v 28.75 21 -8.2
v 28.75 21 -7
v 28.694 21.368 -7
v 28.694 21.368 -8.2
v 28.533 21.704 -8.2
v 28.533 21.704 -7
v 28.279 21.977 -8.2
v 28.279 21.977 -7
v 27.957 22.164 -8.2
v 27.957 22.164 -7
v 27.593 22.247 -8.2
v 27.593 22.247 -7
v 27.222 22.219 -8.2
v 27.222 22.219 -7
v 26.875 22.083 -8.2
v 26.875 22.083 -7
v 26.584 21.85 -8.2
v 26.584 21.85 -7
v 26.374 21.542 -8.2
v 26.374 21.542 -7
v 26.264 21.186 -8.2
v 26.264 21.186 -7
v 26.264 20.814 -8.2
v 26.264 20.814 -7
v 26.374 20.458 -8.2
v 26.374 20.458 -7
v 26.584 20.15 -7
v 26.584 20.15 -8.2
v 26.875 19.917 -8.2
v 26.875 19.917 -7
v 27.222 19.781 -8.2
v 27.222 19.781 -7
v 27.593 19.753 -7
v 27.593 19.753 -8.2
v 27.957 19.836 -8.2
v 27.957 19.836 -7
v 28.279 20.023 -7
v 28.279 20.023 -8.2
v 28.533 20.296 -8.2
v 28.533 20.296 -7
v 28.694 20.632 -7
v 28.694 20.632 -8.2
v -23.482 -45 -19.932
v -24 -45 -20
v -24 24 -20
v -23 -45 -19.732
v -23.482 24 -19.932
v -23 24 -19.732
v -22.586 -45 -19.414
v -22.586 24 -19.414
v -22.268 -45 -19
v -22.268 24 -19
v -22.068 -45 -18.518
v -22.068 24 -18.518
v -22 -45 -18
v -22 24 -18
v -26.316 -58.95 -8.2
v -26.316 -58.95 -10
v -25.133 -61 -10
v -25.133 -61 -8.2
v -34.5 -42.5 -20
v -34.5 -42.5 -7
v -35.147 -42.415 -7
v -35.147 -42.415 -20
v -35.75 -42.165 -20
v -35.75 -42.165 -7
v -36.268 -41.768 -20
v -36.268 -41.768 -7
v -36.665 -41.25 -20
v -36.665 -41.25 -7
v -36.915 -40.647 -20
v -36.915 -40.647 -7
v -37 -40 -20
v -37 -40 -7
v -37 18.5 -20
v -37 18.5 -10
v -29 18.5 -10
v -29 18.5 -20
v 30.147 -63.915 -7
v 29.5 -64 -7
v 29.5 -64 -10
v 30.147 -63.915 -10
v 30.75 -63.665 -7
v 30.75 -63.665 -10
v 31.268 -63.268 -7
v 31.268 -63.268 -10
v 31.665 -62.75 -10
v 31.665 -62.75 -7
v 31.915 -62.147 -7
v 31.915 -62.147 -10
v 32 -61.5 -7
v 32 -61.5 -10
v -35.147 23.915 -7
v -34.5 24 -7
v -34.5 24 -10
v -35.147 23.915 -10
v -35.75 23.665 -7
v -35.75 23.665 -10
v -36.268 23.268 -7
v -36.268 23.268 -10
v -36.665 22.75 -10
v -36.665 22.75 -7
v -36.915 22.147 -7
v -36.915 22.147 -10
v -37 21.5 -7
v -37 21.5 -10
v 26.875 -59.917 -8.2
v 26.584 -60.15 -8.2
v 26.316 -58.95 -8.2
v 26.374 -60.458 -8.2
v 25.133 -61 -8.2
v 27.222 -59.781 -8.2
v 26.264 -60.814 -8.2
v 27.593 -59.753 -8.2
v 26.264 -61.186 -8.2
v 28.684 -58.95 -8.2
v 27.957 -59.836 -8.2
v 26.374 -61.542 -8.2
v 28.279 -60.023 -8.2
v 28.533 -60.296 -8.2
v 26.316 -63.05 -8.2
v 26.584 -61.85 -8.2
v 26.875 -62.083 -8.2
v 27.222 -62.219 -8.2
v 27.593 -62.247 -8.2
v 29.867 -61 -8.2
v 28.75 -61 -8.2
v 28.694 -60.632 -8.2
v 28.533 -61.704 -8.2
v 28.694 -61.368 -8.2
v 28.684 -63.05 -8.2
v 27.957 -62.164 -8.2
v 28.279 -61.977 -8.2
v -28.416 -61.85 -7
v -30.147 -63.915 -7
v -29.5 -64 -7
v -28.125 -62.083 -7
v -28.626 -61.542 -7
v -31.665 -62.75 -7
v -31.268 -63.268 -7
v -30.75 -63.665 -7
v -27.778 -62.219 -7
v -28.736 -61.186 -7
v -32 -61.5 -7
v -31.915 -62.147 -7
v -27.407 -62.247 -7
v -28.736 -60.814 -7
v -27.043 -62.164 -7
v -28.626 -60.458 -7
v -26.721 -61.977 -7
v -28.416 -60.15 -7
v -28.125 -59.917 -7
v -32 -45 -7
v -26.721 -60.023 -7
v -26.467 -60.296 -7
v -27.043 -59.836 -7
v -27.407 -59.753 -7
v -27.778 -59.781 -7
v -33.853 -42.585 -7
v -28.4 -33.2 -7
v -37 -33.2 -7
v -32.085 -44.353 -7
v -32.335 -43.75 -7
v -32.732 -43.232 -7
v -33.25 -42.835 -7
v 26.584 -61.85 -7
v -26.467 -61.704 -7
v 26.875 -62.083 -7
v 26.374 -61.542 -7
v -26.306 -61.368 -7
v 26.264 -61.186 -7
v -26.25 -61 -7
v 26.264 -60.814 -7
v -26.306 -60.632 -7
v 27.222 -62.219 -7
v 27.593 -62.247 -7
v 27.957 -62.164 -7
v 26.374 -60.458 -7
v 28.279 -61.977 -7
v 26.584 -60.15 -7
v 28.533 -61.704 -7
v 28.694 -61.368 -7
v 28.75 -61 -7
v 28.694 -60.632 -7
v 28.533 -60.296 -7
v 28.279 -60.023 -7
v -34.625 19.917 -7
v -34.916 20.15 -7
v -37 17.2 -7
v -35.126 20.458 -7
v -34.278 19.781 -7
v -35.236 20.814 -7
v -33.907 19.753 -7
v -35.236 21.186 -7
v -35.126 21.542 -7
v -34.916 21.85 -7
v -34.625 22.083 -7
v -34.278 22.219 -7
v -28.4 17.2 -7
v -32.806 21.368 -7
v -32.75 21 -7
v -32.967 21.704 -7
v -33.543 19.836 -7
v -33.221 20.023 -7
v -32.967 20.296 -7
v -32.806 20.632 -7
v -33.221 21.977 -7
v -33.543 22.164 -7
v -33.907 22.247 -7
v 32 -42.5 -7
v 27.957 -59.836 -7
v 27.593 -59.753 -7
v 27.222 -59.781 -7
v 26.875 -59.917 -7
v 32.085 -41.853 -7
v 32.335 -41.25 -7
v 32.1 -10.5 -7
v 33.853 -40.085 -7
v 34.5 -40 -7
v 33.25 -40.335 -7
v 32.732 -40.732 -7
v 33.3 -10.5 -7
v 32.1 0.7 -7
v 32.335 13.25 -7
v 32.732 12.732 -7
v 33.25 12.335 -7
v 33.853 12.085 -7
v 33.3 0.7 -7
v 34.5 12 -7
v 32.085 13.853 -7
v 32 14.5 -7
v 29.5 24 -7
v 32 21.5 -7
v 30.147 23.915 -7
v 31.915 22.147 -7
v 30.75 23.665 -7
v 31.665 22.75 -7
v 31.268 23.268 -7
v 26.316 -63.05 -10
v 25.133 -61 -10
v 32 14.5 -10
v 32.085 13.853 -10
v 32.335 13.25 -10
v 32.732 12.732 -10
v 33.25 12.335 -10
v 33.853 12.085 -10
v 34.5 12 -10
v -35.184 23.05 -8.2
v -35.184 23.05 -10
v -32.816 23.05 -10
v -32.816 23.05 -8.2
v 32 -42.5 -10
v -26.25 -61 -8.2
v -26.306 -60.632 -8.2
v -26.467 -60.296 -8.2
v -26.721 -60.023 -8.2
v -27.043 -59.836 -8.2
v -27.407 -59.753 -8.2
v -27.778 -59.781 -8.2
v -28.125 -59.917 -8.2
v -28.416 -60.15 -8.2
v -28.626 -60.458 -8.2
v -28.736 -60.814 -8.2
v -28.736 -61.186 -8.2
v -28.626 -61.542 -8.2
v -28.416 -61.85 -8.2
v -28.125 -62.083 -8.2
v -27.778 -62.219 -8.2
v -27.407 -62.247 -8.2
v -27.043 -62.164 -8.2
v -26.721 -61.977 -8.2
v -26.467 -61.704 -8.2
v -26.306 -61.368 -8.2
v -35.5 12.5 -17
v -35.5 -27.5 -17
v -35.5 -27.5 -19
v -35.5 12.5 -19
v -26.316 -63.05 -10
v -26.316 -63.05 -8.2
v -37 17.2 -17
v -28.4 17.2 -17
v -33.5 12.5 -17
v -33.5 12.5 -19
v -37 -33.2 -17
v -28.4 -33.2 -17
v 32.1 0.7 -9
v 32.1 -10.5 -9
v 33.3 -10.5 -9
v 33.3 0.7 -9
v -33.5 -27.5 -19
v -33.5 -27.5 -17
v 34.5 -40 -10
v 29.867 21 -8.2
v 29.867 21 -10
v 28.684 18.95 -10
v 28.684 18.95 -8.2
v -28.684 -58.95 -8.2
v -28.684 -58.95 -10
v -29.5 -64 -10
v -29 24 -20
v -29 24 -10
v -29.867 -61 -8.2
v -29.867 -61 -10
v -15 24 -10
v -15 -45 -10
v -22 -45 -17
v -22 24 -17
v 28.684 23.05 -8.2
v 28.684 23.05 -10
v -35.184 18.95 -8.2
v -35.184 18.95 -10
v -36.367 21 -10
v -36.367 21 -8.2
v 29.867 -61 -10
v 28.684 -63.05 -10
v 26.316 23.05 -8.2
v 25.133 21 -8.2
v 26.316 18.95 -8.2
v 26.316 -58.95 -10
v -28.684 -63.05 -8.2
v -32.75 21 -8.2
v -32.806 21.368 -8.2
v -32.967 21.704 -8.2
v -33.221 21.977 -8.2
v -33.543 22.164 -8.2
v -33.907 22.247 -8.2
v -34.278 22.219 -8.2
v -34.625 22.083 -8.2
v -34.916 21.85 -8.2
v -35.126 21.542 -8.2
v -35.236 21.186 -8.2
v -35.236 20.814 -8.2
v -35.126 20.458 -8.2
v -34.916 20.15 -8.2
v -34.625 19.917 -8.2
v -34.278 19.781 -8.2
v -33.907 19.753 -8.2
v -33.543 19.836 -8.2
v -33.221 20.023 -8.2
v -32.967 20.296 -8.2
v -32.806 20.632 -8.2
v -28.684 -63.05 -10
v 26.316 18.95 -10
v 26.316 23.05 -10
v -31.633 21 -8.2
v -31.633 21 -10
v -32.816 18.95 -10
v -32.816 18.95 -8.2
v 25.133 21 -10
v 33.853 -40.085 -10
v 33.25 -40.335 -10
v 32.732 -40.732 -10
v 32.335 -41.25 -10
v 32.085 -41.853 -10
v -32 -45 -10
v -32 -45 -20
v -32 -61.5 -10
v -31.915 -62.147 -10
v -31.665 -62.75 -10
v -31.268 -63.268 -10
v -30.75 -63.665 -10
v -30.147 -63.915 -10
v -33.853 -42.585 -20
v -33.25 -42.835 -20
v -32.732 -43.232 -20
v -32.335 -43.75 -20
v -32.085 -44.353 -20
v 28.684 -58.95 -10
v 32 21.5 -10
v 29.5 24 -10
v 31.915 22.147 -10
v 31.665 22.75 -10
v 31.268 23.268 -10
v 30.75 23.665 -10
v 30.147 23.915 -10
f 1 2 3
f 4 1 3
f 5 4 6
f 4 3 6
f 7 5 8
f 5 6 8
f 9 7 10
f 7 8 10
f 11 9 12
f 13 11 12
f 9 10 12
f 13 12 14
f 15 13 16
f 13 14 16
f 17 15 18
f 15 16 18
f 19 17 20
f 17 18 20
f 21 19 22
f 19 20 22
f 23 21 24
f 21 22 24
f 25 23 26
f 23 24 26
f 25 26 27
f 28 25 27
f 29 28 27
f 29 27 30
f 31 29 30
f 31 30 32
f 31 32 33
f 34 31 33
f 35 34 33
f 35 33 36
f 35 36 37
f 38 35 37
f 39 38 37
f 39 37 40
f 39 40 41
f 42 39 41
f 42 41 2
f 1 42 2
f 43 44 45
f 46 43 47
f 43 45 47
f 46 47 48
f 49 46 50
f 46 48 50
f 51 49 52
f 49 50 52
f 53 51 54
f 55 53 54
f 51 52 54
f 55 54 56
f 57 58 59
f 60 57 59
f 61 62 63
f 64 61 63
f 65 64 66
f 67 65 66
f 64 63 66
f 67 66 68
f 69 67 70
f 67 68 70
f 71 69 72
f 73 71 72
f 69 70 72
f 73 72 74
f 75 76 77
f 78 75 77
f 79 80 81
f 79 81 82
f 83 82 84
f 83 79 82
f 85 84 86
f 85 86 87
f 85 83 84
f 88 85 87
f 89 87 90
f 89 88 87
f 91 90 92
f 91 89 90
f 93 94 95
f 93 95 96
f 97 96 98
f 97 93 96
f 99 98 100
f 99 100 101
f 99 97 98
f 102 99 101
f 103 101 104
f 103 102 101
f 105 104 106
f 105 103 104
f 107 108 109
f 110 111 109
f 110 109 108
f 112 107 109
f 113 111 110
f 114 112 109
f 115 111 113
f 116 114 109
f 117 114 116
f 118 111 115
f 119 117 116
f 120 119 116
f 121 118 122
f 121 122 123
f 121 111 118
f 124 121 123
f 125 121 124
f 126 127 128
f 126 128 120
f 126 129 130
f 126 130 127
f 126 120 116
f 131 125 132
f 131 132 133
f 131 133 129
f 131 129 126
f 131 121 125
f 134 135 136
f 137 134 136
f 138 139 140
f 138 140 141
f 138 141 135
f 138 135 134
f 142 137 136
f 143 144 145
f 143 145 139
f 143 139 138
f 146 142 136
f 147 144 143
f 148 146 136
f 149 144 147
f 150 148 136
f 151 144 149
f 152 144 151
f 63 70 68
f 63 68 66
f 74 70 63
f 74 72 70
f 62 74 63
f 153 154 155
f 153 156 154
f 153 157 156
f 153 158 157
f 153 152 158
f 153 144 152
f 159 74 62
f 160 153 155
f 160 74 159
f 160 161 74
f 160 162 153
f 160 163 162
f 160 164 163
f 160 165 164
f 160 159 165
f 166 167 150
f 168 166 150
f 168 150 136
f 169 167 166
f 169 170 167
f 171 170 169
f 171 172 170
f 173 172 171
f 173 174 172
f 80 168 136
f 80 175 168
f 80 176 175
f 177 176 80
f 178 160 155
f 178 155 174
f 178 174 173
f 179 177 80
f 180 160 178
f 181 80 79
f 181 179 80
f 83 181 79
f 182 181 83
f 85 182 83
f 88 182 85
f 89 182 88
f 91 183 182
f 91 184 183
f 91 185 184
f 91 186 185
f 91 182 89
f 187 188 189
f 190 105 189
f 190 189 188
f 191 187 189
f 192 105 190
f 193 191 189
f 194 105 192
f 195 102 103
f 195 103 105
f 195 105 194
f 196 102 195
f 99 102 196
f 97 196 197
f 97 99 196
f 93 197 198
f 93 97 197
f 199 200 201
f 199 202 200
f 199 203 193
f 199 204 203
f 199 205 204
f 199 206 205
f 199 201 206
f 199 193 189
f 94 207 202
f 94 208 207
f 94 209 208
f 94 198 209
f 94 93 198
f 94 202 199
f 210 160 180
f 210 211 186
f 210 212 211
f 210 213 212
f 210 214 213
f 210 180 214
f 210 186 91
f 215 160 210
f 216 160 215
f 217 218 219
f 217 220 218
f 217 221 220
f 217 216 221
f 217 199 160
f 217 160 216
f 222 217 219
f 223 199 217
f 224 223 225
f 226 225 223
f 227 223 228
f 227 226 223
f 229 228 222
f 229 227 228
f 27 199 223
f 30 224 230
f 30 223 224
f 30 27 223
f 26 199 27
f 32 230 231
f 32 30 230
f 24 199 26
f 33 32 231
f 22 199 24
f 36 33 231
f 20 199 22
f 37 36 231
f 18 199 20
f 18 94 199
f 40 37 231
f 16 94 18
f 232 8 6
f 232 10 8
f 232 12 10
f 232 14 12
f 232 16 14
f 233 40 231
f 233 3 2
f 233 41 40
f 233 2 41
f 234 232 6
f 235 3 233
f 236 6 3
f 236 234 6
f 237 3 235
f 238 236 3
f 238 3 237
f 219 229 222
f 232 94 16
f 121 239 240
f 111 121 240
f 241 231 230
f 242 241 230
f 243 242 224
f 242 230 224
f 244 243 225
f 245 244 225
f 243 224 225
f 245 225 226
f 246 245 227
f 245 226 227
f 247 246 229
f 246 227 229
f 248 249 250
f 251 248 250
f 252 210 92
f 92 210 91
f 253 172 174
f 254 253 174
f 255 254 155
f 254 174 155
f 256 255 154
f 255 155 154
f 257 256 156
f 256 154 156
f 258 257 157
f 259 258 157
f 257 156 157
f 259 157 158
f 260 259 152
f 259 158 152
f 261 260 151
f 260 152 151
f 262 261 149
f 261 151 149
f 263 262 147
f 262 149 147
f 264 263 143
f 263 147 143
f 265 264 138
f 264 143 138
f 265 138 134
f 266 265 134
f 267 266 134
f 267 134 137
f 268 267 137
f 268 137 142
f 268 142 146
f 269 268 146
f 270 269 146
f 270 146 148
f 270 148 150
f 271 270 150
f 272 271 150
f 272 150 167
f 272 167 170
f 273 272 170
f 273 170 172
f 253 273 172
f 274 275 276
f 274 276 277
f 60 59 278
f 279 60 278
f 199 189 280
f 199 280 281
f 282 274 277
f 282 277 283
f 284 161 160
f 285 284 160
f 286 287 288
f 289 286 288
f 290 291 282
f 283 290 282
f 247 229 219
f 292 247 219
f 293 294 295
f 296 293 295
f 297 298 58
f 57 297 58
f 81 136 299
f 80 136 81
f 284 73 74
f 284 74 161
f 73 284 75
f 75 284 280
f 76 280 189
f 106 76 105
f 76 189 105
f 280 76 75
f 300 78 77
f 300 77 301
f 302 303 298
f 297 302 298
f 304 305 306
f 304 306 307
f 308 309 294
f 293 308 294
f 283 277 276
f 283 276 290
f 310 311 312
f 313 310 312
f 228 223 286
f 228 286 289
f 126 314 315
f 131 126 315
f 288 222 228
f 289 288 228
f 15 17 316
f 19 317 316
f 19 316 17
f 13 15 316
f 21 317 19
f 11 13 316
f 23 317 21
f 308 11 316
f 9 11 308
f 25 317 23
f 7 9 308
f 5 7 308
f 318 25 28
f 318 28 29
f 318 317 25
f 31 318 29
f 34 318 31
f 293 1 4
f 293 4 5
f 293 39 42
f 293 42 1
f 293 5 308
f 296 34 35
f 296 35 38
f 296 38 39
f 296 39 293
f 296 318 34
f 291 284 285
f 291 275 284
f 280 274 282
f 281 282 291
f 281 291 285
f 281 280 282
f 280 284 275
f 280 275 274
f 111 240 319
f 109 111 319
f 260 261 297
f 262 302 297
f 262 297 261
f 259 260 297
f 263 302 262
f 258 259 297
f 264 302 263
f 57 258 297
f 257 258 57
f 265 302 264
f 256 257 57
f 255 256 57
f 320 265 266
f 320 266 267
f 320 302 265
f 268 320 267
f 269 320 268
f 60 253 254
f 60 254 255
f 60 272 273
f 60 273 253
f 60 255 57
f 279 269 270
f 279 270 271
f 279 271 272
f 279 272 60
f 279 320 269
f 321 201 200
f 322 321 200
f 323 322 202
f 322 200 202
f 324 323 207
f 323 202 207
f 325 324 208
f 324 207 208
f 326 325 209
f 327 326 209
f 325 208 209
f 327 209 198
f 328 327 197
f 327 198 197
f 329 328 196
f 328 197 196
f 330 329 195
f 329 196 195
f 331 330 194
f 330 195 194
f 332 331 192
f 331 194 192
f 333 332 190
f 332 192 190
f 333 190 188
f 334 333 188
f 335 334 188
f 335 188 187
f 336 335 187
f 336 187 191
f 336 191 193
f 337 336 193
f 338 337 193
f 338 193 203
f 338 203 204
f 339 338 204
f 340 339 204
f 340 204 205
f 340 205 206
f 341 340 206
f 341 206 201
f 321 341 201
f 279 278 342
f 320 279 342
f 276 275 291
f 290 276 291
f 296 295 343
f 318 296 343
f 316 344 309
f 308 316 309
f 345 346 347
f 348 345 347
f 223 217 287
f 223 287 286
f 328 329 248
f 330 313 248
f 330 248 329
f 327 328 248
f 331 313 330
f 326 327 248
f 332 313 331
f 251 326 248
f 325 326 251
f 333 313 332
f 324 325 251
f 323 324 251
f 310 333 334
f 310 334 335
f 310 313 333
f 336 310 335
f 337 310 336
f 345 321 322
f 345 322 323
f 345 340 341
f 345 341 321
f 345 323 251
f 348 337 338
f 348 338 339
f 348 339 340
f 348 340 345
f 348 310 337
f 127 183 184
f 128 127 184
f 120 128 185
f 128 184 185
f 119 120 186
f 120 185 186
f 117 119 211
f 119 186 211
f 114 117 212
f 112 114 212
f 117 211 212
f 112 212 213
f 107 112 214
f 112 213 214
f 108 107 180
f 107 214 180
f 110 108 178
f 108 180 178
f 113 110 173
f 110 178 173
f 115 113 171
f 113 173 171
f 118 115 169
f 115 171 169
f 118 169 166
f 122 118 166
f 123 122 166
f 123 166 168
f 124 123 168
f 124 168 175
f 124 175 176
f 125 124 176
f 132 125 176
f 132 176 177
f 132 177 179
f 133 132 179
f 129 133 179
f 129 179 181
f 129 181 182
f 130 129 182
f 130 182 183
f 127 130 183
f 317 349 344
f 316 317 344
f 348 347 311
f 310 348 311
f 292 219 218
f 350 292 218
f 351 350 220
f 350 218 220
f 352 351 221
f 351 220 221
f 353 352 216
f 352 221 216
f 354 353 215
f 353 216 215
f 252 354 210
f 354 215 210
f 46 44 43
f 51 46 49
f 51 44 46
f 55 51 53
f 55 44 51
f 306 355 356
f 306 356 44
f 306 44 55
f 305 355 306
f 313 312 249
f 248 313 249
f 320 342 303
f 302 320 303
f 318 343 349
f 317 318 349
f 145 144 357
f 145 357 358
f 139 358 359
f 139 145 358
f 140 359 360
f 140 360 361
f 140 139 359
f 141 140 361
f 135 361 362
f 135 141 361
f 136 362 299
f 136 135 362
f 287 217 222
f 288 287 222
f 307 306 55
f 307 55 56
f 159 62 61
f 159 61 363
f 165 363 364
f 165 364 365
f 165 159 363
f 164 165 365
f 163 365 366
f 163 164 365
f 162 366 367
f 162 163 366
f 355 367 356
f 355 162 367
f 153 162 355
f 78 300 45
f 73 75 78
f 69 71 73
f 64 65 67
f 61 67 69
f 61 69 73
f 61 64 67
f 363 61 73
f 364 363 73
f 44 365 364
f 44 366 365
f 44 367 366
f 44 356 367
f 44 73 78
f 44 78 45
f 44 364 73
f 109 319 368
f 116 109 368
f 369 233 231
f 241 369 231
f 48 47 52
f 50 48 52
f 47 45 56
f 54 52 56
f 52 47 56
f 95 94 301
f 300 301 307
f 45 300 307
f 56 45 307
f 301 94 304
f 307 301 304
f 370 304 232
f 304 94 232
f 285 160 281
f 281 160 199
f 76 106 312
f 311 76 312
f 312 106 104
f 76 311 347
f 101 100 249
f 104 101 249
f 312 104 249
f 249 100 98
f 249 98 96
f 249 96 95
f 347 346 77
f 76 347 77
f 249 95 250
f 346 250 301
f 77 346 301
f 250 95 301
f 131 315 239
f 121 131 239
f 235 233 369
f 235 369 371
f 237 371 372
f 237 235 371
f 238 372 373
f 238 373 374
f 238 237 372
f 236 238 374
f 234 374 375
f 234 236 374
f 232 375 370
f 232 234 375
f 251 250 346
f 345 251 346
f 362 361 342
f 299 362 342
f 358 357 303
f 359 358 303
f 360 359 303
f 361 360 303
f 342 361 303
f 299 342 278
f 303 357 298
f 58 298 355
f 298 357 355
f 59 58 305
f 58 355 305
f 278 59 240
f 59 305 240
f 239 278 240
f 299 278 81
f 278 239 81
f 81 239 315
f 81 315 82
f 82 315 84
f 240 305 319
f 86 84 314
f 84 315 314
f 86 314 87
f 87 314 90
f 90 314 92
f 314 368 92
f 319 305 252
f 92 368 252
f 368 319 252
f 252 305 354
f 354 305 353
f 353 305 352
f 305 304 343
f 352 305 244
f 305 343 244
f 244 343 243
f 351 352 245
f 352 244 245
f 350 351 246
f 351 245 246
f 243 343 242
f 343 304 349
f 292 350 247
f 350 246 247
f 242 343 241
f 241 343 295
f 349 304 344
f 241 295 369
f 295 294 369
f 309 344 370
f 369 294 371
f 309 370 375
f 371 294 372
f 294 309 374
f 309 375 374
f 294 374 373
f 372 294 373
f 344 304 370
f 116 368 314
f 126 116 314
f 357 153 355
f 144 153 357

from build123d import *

# Parameters (mm, degrees)
PAD021_DEPTH         = 3
SKETCH045_R          = 1.25
POCKET023_DEPTH      = 3.001
POCKET023_DEPTH_BACK = 0.001
POCKET024_DEPTH      = 1.8
PAD022_DEPTH         = 10
SKETCH048_W          = 8.6
SKETCH048_H          = 50.4
POCKET025_DEPTH      = 10
SKETCH049_W          = 2
SKETCH049_H          = 40
POCKET026_DEPTH      = 2
SKETCH050_W          = 1.2
SKETCH050_H          = 11.2
POCKET027_DEPTH      = 2
CHAMFER_SIZE         = 7
FILLET_R             = 2


with BuildPart() as part:
    # Sketch044 → Pad021 (new body)
    with BuildSketch(Plane.XY):
        with BuildLine():
            Line((-29.5, -64), (29.5, -64))
            ThreePointArc((29.5, -64), (31.267767, -63.267767), (32, -61.5))
            Line((32, -42.5), (32, -61.5))
            ThreePointArc((34.5, -40), (32.732233, -40.732233), (32, -42.5))
            Line((34.5, 12), (34.5, -40))
            ThreePointArc((32, 14.5), (32.732233, 12.732233), (34.5, 12))
            Line((32, 21.5), (32, 14.5))
            ThreePointArc((32, 21.5), (31.267767, 23.267767), (29.5, 24))
            Line((29.5, 24), (-34.5, 24))
            ThreePointArc((-34.5, 24), (-36.267767, 23.267767), (-37, 21.5))
            Line((-37, 21.5), (-37, -40))
            ThreePointArc((-37, -40), (-36.267767, -41.767767), (-34.5, -42.5))
            ThreePointArc((-32, -45), (-32.732233, -43.232233), (-34.5, -42.5))
            Line((-32, -45), (-32, -61.5))
            ThreePointArc((-32, -61.5), (-31.267767, -63.267767), (-29.5, -64))
        make_face()
    extrude(amount=-PAD021_DEPTH)

    # Sketch045 → Pocket023 (cut, two sides)
    with BuildSketch(Plane.XY) as pocket023_sk:
        with Locations((-34, 21)):
            Circle(SKETCH045_R)
        with Locations((27.5, 21)):
            Circle(SKETCH045_R)
        with Locations((27.5, -61)):
            Circle(SKETCH045_R)
        with Locations((-27.5, -61)):
            Circle(SKETCH045_R)
    extrude(amount=-POCKET023_DEPTH, mode=Mode.SUBTRACT)
    extrude(pocket023_sk.sketch, amount=POCKET023_DEPTH_BACK, mode=Mode.SUBTRACT)

    # Sketch046 (on Face5 of Pocket023) → Pocket024 (cut)
    with BuildSketch(Plane(origin=(0, 0, -3), x_dir=(1, 0, 0), z_dir=(0, 0, -1))):
        Polygon((-25.132864, 61), (-26.316432, 63.05), (-28.683568, 63.05), (-29.867136, 61), (-28.683568, 58.95), (-26.316432, 58.95), align=None)
        Polygon((29.867136, 61), (28.683568, 63.05), (26.316432, 63.05), (25.132864, 61), (26.316432, 58.95), (28.683568, 58.95), align=None)
        Polygon((-31.632864, -21), (-32.816432, -18.95), (-35.183568, -18.95), (-36.367136, -21), (-35.183568, -23.05), (-32.816432, -23.05), align=None)
        Polygon((29.867136, -21), (28.683568, -18.95), (26.316432, -18.95), (25.132864, -21), (26.316432, -23.05), (28.683568, -23.05), align=None)
    extrude(amount=-POCKET024_DEPTH, mode=Mode.SUBTRACT)

    # Sketch047 (on Face5 of Pocket024) → Pad022 (join)
    with BuildSketch(Plane(origin=(0, 0, -3), x_dir=(1, 0, 0), z_dir=(0, 0, -1))):
        with BuildLine():
            ThreePointArc((-34.5, 42.5), (-36.267767, 41.767767), (-37, 40))
            Line((-37, 40), (-37, -18.5))
            Line((-37, -18.5), (-29, -18.5))
            Line((-29, -18.5), (-29, -24))
            Line((-29, -24), (-22, -24))
            Line((-22, 45), (-22, -24))
            Line((-32, 45), (-22, 45))
            ThreePointArc((-34.5, 42.5), (-32.732233, 43.232233), (-32, 45))
        make_face()
    extrude(amount=PAD022_DEPTH)

    # Sketch048 → Pocket025 (cut)
    with BuildSketch(Plane.XY):
        with Locations((-32.7, -8)):
            Rectangle(SKETCH048_W, SKETCH048_H)
    extrude(amount=-POCKET025_DEPTH, mode=Mode.SUBTRACT)

    # Sketch049 (on Face50 of Pocket025) → Pocket026 (cut)
    with BuildSketch(Plane.XY.offset(-10)):
        with Locations((-34.5, -7.5)):
            Rectangle(SKETCH049_W, SKETCH049_H)
    extrude(amount=-POCKET026_DEPTH, mode=Mode.SUBTRACT)

    # Sketch050 → Pocket027 (cut)
    with BuildSketch(Plane.XY):
        with Locations((32.7, -4.9)):
            Rectangle(SKETCH050_W, SKETCH050_H)
    extrude(amount=-POCKET027_DEPTH, mode=Mode.SUBTRACT)

    # Chamfer
    chamfer_edges = [part.edges().sort_by_distance(p)[0] for p in [
        (-22, -10.5, -3),
    ]]
    chamfer(chamfer_edges, length=CHAMFER_SIZE)

    # Fillet
    fillet_edges = [part.edges().sort_by_distance(p)[0] for p in [
        (-22, -10.5, -13),
    ]]
    fillet(fillet_edges, radius=FILLET_R)


with BuildPart() as part_1:
    # Body006 placement: moved
    add(part.part.moved(Location((0, 0, -7))))


solid = part_1.part
